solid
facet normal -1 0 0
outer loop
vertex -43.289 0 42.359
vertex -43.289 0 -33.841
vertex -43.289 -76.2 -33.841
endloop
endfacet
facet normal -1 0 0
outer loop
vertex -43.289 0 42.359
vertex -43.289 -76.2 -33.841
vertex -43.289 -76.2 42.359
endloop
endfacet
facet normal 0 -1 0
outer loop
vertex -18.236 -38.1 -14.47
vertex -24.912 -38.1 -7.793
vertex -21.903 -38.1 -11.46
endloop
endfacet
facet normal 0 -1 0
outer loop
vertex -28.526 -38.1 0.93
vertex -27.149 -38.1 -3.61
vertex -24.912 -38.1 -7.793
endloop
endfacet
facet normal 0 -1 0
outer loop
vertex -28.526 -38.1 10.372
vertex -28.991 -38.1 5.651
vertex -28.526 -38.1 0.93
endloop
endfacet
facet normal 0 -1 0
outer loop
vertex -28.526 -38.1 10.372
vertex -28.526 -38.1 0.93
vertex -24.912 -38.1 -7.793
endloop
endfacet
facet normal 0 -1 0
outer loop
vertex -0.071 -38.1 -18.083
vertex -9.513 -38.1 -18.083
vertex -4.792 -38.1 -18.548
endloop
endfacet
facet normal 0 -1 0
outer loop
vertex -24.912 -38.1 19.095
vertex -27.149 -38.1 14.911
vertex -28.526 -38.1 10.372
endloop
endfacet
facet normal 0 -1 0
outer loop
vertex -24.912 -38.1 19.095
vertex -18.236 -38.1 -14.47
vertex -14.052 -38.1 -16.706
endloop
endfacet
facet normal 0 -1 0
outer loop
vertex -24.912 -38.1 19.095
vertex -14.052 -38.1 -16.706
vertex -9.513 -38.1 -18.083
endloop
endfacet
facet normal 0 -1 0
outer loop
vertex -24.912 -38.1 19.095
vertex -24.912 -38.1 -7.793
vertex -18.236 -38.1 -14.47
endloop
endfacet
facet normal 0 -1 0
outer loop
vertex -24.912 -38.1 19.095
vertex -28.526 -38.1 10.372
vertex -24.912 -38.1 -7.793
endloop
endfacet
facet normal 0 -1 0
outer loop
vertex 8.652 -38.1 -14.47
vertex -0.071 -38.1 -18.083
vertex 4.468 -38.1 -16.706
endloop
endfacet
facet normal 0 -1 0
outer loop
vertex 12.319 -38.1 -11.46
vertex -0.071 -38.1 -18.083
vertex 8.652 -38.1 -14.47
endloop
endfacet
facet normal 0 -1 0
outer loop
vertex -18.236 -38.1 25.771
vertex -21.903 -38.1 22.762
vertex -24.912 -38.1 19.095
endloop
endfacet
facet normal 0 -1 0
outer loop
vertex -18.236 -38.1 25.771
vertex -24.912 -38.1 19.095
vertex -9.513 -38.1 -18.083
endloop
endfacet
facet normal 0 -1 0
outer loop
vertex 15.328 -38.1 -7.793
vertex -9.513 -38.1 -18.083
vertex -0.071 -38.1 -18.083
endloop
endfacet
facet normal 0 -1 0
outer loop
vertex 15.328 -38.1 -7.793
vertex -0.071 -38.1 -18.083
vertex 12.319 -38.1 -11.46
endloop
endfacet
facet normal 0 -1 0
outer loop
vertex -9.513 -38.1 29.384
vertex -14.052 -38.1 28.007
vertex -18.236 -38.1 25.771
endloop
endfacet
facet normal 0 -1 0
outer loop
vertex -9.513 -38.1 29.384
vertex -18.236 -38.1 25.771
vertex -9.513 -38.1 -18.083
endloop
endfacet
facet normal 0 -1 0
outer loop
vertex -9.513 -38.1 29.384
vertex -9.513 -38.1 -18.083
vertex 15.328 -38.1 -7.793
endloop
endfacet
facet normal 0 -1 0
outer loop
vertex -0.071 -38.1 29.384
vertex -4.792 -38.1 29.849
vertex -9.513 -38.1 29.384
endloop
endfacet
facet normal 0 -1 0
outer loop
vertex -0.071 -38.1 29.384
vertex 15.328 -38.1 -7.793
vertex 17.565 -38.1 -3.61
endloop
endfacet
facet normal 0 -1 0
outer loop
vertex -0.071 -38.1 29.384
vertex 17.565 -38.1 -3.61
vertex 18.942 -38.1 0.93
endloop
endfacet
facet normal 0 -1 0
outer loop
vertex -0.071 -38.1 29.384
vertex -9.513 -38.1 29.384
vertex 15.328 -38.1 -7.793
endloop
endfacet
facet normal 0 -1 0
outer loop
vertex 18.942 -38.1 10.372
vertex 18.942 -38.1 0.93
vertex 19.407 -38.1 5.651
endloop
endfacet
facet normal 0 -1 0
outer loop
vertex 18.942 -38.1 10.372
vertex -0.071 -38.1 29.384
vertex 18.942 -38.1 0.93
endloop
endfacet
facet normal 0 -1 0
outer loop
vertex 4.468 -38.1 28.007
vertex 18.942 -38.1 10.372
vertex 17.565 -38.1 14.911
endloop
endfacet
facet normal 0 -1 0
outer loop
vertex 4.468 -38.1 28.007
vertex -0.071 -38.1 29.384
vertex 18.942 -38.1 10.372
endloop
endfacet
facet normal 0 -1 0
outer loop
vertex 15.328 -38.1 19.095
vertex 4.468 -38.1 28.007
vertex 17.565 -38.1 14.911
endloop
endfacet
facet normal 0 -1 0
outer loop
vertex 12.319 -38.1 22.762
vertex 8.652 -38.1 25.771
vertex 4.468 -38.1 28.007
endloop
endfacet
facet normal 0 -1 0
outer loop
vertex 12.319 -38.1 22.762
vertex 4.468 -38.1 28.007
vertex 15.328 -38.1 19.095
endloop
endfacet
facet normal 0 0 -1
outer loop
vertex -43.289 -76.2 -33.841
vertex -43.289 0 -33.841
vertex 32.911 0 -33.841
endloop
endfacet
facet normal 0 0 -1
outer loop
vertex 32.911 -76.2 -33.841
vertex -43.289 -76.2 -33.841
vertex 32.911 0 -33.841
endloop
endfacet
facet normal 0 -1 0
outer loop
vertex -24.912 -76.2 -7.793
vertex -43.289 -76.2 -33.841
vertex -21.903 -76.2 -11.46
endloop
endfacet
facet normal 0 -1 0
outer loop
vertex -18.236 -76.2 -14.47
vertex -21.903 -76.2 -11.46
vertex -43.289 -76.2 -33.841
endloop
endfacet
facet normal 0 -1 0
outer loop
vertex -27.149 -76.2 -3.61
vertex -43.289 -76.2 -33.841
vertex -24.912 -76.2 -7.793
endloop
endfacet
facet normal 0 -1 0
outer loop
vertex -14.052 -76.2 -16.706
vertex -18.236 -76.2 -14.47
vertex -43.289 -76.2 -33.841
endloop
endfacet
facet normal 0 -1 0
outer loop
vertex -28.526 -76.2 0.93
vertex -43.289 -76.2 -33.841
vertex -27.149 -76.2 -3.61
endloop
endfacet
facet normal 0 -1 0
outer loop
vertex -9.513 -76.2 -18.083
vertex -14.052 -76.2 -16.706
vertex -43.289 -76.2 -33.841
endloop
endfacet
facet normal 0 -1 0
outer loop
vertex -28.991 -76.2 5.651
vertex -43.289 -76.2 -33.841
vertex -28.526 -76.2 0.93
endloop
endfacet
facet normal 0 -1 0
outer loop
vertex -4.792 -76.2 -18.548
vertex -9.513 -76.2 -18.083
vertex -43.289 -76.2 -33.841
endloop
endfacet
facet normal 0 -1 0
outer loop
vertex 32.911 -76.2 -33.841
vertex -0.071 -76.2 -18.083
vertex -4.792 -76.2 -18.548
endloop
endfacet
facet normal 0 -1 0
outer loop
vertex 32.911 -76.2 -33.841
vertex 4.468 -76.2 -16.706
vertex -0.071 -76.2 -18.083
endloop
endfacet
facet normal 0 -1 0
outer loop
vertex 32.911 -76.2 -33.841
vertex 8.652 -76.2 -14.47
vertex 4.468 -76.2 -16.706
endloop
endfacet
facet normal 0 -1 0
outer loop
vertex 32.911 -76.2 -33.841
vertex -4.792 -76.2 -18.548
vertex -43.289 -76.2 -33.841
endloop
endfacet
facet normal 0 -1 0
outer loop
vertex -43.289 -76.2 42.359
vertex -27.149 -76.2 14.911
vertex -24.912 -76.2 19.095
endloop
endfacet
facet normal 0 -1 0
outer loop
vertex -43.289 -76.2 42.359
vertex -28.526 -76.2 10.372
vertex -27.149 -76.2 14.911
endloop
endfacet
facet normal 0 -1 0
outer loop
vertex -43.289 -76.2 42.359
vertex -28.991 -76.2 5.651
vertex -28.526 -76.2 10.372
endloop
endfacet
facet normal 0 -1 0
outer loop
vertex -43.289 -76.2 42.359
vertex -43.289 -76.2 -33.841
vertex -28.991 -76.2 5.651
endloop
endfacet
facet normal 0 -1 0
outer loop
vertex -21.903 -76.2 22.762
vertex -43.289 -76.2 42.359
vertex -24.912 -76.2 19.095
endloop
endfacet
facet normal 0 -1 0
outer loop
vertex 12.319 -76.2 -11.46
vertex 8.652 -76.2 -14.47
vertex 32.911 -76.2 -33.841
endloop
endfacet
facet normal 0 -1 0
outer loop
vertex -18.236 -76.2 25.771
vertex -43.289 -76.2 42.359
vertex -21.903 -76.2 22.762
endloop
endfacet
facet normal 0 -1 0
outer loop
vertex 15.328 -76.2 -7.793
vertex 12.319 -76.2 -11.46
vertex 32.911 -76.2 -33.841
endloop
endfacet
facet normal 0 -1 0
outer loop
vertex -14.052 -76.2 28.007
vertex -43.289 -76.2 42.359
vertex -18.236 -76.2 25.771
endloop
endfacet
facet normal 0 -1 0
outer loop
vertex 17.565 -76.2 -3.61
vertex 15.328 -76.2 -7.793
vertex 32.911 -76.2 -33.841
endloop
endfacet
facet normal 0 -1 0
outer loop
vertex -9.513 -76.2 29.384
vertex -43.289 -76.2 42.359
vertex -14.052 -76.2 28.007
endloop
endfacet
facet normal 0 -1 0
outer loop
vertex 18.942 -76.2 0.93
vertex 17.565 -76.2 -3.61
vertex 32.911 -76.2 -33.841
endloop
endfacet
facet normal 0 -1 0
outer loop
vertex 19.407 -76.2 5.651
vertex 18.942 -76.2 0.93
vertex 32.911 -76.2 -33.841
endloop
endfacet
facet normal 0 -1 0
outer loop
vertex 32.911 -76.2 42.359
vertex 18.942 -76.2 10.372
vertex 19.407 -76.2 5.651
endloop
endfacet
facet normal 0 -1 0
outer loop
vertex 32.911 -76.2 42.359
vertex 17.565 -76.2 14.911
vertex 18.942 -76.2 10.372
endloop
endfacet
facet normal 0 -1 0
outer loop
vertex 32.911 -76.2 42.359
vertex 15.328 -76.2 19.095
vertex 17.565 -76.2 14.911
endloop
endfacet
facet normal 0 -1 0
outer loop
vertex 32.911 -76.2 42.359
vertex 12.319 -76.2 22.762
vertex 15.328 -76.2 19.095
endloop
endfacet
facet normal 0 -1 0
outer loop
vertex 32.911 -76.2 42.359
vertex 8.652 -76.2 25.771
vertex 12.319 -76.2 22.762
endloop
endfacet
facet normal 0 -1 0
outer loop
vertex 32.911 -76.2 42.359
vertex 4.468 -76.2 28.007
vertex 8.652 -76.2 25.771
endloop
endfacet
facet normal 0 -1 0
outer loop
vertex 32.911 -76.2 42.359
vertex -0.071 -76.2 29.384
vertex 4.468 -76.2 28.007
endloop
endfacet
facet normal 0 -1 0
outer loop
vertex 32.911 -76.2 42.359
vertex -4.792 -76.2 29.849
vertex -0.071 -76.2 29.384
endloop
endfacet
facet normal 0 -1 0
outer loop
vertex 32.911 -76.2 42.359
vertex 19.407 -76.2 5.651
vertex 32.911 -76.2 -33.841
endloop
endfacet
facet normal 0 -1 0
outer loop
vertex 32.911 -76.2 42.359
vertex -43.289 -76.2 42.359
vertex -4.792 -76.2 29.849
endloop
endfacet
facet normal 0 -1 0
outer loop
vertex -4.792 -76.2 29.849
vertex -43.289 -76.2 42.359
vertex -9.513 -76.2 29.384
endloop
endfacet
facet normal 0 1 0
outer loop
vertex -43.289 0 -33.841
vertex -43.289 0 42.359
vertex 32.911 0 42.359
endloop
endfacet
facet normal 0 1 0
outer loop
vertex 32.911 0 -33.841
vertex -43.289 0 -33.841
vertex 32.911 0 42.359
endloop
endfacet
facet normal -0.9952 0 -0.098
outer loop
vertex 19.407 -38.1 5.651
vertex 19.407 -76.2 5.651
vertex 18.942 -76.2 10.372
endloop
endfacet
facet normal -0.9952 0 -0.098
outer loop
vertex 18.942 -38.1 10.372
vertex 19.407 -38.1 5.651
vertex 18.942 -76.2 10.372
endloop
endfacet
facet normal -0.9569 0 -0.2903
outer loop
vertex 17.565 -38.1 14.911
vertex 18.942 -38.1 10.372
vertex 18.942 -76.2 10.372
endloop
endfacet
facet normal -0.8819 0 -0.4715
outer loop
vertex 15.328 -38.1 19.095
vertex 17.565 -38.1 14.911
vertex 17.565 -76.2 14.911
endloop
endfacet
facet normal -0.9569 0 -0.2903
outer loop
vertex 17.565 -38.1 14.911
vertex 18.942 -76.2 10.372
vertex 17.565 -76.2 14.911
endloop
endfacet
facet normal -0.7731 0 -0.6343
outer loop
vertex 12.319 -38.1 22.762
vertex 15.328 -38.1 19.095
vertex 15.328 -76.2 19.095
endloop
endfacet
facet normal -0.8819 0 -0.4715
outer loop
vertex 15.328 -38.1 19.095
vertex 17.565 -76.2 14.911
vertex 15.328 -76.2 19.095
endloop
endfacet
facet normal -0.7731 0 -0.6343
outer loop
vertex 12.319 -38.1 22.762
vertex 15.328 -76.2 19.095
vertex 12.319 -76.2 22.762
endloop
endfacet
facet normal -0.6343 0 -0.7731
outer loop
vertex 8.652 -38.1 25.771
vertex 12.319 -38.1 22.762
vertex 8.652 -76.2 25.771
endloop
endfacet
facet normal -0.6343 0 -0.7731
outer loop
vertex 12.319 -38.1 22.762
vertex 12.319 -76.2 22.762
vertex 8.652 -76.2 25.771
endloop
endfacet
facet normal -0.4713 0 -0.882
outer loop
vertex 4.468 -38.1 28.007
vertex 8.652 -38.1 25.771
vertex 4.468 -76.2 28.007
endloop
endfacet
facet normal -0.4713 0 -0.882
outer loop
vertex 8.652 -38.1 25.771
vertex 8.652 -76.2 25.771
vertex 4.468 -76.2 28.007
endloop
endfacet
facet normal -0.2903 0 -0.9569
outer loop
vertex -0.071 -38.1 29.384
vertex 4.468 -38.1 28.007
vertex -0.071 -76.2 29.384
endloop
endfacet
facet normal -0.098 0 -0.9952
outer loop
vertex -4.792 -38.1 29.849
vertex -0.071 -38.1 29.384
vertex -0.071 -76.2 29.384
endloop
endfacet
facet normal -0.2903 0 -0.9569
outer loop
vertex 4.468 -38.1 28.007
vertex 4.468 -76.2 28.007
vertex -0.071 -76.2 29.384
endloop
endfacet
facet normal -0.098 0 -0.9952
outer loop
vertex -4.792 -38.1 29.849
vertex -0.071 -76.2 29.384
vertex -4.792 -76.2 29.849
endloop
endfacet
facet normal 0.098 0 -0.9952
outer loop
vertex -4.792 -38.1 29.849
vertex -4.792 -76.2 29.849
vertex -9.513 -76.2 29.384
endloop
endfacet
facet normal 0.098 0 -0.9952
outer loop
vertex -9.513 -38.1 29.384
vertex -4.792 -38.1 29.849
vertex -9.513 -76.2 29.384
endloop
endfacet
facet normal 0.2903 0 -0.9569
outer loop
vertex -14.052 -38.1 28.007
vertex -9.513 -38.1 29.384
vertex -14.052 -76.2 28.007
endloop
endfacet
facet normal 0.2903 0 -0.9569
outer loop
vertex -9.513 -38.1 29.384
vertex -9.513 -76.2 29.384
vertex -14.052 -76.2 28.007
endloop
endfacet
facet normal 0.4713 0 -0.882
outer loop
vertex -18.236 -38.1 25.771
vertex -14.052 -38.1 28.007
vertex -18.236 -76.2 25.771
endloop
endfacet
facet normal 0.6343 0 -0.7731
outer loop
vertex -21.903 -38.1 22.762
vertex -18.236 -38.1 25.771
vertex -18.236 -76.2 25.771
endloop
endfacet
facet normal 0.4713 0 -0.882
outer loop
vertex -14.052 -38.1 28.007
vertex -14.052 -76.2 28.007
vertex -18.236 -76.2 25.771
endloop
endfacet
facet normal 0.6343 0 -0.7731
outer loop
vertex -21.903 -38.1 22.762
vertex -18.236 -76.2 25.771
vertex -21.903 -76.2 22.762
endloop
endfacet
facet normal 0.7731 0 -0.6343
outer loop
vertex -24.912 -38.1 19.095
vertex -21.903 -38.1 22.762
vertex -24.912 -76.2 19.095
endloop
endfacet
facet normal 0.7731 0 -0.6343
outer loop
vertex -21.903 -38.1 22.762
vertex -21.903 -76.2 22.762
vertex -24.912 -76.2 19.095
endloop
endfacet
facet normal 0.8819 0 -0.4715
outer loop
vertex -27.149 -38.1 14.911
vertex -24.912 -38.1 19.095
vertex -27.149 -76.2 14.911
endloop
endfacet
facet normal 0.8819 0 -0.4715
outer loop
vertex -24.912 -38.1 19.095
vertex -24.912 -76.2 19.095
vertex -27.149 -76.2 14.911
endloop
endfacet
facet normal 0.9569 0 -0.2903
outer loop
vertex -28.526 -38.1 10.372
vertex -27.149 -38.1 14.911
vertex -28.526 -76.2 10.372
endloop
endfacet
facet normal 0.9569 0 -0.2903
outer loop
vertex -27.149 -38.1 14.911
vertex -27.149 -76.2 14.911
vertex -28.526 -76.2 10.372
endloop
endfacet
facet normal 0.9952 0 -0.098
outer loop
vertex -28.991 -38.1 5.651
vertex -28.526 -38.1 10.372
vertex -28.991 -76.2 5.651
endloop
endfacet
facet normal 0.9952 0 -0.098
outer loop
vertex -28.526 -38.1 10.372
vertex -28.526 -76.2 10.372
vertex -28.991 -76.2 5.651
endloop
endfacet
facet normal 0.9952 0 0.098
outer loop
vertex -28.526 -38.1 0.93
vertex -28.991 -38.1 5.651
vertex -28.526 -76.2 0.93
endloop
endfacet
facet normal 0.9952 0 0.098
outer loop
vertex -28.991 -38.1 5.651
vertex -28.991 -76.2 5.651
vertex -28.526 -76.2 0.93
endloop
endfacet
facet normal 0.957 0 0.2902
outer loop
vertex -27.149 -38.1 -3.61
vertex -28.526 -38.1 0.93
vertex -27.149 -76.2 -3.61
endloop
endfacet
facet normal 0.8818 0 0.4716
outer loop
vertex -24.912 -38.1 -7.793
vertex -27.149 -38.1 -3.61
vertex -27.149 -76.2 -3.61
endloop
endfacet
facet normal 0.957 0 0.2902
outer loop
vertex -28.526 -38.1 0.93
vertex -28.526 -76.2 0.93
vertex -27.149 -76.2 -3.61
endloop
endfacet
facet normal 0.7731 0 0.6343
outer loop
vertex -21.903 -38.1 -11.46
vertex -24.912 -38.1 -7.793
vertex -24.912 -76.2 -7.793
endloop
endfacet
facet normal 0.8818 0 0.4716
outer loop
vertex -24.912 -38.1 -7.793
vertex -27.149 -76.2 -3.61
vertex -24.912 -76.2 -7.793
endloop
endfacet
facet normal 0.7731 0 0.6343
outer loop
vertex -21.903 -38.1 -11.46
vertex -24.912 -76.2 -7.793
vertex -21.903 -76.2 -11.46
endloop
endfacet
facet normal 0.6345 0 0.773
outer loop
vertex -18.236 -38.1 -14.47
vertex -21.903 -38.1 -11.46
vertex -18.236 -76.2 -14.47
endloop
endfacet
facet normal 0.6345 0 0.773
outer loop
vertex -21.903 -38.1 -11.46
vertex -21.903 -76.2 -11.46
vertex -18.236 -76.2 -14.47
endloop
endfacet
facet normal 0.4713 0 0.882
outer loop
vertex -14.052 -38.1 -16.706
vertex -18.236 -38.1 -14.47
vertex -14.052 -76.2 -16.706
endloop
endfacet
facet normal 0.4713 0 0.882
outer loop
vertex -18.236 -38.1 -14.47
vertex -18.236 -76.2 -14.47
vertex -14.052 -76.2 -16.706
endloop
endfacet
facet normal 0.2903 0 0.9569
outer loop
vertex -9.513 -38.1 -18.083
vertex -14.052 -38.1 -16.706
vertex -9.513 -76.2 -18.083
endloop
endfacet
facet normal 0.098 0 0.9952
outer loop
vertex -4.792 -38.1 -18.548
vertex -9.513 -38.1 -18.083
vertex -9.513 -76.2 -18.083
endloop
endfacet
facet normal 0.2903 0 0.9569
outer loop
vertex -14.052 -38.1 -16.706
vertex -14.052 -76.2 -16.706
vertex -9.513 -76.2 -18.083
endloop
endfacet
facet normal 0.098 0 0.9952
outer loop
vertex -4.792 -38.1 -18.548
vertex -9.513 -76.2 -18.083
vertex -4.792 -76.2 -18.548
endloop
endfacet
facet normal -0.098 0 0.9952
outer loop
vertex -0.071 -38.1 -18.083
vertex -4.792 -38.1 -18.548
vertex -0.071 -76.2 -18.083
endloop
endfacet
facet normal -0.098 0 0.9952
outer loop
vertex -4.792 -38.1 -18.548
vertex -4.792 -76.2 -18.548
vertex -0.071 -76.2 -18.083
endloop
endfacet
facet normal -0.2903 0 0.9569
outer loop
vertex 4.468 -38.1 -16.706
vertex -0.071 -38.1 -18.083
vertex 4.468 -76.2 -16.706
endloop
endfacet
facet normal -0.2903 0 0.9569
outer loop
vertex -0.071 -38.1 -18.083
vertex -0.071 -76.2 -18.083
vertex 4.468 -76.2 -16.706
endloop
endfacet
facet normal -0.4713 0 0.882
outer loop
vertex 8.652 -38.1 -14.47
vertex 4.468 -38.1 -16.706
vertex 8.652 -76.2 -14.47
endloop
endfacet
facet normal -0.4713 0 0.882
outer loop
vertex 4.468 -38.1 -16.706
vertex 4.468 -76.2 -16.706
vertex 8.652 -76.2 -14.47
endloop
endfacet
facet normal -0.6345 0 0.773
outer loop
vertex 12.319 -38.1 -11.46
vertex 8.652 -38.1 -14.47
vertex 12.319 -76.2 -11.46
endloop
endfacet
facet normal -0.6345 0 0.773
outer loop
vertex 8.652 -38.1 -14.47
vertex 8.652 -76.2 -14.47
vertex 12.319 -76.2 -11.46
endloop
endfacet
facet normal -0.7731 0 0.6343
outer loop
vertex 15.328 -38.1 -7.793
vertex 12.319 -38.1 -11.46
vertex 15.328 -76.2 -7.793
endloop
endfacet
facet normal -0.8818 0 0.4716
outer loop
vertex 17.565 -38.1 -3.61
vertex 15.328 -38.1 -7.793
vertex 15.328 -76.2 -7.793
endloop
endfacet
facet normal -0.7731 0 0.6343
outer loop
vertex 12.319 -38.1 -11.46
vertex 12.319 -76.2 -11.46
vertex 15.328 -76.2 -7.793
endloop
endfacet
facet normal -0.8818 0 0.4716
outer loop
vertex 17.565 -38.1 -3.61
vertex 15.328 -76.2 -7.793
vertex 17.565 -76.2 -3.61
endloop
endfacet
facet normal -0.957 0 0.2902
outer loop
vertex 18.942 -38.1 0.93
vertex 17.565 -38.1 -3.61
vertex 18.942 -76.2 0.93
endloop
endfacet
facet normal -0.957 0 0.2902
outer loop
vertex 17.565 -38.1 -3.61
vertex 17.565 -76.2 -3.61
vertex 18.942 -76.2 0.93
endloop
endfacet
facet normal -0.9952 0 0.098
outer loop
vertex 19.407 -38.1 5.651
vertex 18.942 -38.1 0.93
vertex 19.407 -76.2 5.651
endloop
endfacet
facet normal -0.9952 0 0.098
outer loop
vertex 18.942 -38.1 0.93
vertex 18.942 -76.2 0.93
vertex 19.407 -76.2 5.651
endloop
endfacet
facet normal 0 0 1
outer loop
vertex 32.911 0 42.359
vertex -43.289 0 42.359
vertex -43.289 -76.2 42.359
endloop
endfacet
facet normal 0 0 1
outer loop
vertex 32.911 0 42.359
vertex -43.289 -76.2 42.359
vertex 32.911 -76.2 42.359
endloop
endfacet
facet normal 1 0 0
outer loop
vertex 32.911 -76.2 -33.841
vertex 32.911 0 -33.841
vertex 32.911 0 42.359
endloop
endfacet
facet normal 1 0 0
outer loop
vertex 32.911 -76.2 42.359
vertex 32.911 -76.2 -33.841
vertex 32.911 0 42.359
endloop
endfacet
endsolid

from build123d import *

# Parameters (mm, degrees)
F0_W     = 76.2
F0_H     = 76.2
F1_DEPTH = 76.2
F2_R     = 24.198558
F3_DEPTH = 38.1


with BuildPart() as f1:
    # F0 (on Front) → F1 (new body)
    with BuildSketch(Plane.XZ):
        with Locations((-5.188912, 4.258561)):
            Rectangle(F0_W, F0_H)
    extrude(amount=F1_DEPTH)

    # F2 (on face) → F3 (cut, symmetric)
    with BuildSketch(Plane.XZ.offset(76.2)):
        with Locations((-4.792011, 5.650742)):
            Circle(F2_R)
    extrude(amount=F3_DEPTH, both=True, mode=Mode.SUBTRACT)


solid = f1.part
